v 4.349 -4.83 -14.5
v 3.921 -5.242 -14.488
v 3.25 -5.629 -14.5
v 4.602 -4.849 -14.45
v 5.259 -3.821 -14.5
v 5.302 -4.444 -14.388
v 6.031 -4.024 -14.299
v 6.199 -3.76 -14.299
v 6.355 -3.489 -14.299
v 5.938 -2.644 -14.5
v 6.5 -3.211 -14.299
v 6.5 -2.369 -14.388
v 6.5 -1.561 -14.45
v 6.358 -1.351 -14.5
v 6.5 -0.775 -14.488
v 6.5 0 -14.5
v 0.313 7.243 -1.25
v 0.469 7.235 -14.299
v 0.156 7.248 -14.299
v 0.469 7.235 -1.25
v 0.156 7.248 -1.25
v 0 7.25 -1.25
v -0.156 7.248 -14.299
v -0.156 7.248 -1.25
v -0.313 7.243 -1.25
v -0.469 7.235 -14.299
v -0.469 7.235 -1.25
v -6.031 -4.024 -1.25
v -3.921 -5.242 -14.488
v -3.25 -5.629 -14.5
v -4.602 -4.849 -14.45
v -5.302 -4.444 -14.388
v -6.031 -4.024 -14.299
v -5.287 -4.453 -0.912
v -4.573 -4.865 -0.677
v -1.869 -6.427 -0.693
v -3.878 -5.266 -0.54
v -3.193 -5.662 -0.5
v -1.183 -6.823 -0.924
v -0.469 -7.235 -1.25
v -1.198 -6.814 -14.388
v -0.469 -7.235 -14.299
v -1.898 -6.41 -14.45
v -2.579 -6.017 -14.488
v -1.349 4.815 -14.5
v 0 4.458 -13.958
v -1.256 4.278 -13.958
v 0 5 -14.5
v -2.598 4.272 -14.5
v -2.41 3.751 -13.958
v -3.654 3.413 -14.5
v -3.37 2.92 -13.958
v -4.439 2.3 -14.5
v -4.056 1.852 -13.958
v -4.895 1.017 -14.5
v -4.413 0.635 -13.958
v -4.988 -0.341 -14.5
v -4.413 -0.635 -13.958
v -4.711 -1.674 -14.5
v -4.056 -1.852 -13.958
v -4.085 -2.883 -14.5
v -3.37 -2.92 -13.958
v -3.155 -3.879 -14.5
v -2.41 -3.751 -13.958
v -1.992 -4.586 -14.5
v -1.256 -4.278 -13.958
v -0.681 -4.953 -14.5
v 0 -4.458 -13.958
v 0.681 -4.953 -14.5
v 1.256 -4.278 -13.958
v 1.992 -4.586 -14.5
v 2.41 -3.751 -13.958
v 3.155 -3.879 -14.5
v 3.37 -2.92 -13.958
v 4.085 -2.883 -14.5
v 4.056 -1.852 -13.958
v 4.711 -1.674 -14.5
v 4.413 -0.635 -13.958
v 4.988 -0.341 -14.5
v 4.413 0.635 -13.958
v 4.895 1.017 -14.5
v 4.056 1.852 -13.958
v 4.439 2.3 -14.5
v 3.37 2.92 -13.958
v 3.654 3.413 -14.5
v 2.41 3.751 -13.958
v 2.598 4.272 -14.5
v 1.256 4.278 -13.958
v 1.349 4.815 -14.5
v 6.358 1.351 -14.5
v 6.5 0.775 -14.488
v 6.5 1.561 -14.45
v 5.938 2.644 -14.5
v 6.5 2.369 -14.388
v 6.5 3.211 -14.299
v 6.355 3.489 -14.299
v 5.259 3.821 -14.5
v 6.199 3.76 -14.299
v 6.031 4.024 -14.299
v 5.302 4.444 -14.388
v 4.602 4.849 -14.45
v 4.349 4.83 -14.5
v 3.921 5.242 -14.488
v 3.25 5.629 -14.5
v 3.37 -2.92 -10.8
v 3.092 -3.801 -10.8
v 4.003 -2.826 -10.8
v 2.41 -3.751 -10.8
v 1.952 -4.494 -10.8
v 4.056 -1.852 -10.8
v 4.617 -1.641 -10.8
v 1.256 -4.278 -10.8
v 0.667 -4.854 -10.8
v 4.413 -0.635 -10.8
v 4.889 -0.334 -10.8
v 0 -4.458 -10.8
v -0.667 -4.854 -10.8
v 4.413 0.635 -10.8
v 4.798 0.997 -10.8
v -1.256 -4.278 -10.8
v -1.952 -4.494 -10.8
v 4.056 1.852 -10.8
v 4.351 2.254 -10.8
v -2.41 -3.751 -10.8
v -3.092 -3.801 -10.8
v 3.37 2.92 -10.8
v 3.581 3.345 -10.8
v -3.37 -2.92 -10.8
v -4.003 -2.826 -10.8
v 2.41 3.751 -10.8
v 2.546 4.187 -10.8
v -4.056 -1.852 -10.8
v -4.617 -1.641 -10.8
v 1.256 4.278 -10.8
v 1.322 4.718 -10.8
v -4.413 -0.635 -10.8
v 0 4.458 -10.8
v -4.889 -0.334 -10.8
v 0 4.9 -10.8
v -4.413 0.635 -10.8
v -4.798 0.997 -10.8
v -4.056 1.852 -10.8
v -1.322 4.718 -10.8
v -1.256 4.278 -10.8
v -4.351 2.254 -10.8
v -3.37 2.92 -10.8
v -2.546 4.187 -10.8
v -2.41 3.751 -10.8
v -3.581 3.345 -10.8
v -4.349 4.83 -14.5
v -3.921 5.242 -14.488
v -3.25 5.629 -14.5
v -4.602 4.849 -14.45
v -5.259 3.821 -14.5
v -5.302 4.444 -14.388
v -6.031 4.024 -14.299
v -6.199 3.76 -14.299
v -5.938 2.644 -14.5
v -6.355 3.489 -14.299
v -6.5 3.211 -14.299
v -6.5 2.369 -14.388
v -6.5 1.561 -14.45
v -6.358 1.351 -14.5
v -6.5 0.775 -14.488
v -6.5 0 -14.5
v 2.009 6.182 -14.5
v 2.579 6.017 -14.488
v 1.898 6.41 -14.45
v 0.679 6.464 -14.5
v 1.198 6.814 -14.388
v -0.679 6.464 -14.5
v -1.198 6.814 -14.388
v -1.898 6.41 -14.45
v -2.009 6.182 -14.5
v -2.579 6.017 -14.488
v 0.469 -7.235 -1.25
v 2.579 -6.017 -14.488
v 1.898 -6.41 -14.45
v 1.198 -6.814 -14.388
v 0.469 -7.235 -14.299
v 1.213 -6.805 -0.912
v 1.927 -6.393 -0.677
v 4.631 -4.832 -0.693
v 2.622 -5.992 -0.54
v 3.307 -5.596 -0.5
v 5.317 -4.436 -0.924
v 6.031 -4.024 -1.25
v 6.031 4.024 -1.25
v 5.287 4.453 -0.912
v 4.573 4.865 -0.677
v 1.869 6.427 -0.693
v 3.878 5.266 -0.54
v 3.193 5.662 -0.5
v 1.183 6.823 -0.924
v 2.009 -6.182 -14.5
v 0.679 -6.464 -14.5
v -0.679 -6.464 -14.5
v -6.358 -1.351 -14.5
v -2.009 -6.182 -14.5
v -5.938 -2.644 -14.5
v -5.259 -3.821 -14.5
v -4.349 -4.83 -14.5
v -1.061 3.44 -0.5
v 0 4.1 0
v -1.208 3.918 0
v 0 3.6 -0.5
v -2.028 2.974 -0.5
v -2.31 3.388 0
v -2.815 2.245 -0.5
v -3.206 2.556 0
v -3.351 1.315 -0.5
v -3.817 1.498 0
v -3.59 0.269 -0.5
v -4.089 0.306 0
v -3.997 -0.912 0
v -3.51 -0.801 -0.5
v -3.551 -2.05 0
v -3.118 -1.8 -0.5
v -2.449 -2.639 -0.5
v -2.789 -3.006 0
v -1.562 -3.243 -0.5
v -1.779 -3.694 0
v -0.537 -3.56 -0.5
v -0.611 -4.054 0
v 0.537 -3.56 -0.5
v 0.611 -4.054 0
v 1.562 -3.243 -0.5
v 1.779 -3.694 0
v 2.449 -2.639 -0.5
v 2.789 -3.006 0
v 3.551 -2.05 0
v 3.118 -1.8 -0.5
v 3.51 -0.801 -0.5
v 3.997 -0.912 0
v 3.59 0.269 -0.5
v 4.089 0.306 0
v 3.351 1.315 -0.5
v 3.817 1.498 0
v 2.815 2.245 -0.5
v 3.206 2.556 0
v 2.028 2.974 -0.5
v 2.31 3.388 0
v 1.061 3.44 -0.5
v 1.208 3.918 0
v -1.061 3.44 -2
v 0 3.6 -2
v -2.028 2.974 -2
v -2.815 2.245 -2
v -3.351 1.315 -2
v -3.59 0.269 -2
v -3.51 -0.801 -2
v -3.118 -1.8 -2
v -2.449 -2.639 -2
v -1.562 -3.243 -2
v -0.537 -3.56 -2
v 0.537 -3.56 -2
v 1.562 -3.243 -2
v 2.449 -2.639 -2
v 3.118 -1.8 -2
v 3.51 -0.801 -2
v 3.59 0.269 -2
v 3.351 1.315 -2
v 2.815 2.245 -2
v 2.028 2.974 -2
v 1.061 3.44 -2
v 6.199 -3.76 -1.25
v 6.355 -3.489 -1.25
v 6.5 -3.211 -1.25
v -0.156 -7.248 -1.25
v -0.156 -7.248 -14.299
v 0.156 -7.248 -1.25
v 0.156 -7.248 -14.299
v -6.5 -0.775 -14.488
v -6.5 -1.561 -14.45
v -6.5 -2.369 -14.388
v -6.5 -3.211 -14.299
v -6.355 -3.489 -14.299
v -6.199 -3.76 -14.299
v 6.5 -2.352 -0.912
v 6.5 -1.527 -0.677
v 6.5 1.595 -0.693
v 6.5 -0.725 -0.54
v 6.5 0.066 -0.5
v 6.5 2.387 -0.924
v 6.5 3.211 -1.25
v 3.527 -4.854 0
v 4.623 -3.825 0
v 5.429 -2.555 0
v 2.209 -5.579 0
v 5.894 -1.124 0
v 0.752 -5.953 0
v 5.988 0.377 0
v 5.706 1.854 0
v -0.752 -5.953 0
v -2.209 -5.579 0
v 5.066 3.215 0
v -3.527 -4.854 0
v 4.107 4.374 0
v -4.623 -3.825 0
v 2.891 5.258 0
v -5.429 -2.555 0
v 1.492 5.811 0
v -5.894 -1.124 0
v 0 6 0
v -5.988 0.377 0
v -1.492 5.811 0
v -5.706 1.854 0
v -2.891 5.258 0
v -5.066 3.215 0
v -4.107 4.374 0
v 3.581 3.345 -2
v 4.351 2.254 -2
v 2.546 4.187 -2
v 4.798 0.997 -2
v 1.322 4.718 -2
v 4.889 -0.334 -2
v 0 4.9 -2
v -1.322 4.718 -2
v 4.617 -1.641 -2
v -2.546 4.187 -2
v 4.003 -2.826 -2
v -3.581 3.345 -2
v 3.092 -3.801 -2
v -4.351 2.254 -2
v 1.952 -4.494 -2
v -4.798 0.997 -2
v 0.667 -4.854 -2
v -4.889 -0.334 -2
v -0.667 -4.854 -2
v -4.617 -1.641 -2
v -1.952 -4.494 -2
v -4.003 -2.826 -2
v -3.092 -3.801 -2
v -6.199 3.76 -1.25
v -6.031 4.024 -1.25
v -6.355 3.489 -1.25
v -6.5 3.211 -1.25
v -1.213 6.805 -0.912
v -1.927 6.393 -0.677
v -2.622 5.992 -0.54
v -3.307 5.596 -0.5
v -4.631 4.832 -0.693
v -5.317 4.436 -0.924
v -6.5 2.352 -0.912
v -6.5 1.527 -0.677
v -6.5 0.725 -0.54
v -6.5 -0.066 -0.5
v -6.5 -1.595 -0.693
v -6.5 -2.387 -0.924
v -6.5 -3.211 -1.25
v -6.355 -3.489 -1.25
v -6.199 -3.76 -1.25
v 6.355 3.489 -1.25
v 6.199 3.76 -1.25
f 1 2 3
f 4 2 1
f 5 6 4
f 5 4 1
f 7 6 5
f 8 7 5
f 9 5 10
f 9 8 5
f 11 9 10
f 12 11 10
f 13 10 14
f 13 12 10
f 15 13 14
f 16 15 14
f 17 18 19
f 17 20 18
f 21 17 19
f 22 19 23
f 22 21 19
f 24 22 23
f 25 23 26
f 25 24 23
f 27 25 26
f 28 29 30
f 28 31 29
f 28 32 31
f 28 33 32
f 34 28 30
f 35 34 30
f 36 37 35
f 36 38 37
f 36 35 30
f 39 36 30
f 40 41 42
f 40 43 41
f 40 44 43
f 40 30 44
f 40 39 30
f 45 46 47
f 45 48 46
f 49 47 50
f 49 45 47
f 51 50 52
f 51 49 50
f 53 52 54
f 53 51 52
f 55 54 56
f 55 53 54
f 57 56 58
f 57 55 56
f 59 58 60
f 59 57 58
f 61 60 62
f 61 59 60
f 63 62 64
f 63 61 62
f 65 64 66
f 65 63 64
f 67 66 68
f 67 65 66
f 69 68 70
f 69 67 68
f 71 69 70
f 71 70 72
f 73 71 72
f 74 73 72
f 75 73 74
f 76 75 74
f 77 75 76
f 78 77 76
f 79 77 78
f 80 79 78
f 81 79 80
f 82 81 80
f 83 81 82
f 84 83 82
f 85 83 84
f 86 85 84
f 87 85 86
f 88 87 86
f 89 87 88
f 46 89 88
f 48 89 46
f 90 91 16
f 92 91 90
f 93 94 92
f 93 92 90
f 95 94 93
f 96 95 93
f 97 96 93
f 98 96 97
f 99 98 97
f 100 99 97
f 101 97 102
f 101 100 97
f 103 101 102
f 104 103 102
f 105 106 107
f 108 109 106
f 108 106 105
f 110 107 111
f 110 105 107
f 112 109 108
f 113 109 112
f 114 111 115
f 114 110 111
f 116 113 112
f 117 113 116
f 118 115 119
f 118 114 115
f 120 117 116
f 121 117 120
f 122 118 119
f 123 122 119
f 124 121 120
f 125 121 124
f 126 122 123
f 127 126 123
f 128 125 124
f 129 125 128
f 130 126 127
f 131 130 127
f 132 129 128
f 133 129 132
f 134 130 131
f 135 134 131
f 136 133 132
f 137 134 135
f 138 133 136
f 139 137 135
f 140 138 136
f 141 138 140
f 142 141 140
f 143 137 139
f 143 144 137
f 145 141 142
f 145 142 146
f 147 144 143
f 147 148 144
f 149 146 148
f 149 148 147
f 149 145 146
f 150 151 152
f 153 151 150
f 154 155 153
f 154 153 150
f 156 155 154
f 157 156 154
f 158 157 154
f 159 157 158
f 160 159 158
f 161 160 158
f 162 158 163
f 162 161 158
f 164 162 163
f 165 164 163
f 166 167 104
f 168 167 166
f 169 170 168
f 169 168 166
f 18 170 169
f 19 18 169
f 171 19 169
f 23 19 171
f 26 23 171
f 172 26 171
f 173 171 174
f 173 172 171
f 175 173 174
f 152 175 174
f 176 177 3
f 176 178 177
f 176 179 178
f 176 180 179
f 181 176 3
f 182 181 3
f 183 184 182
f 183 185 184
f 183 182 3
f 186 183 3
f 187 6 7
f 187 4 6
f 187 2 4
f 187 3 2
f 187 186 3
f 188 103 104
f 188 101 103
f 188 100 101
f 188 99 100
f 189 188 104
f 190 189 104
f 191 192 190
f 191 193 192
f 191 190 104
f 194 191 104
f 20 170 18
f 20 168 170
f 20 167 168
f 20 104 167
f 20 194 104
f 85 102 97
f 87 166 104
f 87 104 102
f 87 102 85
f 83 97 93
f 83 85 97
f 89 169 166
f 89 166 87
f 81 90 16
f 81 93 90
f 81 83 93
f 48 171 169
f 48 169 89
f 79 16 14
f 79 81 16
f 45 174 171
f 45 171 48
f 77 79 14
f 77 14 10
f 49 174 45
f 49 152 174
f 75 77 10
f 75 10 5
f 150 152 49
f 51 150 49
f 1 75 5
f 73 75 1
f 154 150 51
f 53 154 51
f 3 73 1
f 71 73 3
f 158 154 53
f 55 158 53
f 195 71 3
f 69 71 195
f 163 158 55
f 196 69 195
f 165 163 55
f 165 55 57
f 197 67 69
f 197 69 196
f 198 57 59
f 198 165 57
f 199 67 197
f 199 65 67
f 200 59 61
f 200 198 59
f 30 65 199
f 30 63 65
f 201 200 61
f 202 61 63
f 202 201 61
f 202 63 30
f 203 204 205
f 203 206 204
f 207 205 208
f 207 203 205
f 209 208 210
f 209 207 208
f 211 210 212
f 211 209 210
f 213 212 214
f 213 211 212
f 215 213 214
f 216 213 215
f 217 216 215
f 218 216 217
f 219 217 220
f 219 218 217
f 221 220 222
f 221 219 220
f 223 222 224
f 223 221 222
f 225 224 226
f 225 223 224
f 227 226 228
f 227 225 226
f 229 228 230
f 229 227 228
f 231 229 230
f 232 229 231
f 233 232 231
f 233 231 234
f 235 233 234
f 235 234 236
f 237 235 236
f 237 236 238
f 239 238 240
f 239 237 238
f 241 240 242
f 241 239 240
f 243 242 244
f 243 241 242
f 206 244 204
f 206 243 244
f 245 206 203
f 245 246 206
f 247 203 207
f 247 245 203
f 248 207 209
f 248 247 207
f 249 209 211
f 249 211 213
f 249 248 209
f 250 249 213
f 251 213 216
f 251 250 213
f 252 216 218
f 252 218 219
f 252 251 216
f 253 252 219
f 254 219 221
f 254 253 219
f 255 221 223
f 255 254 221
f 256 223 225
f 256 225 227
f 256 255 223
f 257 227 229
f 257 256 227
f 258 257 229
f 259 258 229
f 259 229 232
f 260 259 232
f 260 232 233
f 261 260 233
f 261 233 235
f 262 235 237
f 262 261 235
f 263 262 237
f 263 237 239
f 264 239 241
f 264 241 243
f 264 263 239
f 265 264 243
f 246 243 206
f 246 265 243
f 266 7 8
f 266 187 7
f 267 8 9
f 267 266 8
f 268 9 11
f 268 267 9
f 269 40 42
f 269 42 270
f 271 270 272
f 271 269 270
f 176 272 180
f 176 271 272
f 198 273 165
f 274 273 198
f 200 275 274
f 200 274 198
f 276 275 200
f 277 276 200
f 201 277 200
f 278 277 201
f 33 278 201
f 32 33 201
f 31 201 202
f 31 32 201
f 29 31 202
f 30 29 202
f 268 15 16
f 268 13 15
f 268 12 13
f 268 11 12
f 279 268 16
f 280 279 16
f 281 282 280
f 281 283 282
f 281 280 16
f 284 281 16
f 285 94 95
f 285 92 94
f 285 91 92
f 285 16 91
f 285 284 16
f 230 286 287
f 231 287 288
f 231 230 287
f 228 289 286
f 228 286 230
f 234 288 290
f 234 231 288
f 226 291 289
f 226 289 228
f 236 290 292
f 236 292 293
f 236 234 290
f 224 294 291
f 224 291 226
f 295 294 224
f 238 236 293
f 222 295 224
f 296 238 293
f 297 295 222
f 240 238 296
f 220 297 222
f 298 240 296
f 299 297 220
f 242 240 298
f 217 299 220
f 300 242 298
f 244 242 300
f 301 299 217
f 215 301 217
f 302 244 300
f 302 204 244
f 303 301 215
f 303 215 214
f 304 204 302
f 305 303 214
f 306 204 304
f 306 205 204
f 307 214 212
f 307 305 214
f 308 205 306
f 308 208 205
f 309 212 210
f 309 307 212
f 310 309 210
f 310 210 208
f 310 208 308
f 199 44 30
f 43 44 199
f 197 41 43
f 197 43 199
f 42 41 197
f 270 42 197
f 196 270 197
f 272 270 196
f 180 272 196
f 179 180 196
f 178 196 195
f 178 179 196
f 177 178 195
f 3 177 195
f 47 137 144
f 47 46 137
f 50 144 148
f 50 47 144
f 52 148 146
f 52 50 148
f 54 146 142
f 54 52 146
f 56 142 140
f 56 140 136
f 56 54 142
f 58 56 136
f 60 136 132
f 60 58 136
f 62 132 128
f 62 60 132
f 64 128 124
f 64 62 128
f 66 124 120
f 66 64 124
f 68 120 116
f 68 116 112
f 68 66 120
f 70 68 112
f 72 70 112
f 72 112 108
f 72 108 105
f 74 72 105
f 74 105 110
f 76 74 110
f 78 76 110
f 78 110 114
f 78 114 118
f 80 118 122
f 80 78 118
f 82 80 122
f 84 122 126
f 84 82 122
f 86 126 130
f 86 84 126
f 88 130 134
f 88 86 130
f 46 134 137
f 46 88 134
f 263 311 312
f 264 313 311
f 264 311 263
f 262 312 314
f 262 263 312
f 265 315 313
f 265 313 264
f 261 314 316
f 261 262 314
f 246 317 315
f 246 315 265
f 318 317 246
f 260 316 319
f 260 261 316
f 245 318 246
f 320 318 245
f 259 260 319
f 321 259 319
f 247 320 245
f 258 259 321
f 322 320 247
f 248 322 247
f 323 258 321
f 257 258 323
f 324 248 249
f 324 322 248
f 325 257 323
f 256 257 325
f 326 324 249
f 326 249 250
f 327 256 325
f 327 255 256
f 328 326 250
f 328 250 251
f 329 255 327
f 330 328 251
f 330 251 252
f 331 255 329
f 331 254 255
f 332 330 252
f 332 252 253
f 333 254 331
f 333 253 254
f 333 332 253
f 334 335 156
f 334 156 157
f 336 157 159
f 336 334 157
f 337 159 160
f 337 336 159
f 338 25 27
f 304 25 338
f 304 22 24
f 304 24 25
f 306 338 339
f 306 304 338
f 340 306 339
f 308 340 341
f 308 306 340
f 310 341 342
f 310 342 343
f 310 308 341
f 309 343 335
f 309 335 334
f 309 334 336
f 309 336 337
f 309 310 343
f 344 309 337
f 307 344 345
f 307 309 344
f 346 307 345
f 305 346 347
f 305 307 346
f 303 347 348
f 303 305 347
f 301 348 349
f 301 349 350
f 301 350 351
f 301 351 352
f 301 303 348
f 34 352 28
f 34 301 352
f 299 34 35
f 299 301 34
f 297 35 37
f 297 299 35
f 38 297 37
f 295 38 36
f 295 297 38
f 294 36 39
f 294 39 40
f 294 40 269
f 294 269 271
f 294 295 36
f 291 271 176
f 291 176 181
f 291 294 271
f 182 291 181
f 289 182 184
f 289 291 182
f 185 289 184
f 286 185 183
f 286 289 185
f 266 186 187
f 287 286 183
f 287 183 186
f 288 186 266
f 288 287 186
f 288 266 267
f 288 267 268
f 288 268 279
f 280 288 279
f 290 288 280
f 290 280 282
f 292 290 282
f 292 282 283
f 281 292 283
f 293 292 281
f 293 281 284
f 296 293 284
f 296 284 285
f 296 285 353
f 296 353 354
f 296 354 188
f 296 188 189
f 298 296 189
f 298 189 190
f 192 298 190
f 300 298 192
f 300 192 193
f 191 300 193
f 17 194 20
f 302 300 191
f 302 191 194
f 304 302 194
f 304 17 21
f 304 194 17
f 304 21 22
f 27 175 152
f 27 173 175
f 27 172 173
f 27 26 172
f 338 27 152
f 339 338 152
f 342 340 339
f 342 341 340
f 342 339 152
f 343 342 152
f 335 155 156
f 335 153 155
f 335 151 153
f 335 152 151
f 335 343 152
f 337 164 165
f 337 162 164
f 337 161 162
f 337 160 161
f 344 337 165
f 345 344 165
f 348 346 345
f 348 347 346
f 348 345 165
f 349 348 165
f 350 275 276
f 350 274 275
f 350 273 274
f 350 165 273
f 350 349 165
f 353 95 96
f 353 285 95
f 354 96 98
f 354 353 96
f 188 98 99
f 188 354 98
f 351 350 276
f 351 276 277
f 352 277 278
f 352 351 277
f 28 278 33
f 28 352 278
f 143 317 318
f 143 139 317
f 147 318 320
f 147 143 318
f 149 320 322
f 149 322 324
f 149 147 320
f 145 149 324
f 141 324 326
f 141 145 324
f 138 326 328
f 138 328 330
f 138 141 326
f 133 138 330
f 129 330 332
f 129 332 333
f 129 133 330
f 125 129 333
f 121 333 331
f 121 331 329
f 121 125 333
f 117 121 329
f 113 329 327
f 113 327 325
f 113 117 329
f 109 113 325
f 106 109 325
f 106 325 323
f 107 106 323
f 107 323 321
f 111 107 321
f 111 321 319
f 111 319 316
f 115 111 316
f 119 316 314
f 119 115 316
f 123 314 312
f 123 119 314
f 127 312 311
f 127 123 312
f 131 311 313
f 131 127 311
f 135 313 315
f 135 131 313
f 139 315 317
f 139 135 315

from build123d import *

# Parameters (mm, degrees)
SCHNITT_LINEAR_AUSTRAGEN1_DEPTH      = 30
SCHNITT_LINEAR_AUSTRAGEN1_DEPTH_BACK = 30
SKIZZE2_W                            = 67.3333
SKIZZE2_H                            = 68


with BuildPart() as part:
    # Skizze1 → Rotation1 (revolve)
    with BuildSketch(Plane(origin=(0, 0, 0), x_dir=(0, 0, -1), z_dir=(1, 0, 0))):
        Polygon((0, 4.1), (0.5, 3.6), (2, 3.6), (2, 4.9), (10.8, 4.9), (10.8, 4.4585), (13.9585, 4.4585), (14.5, 5), (14.5, 6.5), (14.299038106, 7.25), (1.25, 7.25), (0, 6), align=None)
    revolve(axis=Axis((0, 0, -14.5), (0, 0, 1)))

    # Skizze2 → Schnitt-Linear austragen1 (cut, two sides: drawn at the far end of the back side and taken through both)
    with BuildSketch(Plane.XY.offset(-SCHNITT_LINEAR_AUSTRAGEN1_DEPTH_BACK)):
        with Locations((-1.08335, 0.1667)):
            Rectangle(SKIZZE2_W, SKIZZE2_H)
        Polygon((-6.5, -3.75277675), (0, -7.505553499), (6.5, -3.75277675), (6.5, 3.75277675), (0, 7.505553499), (-6.5, 3.75277675), align=None, mode=Mode.SUBTRACT)
    extrude(amount=SCHNITT_LINEAR_AUSTRAGEN1_DEPTH + SCHNITT_LINEAR_AUSTRAGEN1_DEPTH_BACK, mode=Mode.SUBTRACT)


solid = part.part
